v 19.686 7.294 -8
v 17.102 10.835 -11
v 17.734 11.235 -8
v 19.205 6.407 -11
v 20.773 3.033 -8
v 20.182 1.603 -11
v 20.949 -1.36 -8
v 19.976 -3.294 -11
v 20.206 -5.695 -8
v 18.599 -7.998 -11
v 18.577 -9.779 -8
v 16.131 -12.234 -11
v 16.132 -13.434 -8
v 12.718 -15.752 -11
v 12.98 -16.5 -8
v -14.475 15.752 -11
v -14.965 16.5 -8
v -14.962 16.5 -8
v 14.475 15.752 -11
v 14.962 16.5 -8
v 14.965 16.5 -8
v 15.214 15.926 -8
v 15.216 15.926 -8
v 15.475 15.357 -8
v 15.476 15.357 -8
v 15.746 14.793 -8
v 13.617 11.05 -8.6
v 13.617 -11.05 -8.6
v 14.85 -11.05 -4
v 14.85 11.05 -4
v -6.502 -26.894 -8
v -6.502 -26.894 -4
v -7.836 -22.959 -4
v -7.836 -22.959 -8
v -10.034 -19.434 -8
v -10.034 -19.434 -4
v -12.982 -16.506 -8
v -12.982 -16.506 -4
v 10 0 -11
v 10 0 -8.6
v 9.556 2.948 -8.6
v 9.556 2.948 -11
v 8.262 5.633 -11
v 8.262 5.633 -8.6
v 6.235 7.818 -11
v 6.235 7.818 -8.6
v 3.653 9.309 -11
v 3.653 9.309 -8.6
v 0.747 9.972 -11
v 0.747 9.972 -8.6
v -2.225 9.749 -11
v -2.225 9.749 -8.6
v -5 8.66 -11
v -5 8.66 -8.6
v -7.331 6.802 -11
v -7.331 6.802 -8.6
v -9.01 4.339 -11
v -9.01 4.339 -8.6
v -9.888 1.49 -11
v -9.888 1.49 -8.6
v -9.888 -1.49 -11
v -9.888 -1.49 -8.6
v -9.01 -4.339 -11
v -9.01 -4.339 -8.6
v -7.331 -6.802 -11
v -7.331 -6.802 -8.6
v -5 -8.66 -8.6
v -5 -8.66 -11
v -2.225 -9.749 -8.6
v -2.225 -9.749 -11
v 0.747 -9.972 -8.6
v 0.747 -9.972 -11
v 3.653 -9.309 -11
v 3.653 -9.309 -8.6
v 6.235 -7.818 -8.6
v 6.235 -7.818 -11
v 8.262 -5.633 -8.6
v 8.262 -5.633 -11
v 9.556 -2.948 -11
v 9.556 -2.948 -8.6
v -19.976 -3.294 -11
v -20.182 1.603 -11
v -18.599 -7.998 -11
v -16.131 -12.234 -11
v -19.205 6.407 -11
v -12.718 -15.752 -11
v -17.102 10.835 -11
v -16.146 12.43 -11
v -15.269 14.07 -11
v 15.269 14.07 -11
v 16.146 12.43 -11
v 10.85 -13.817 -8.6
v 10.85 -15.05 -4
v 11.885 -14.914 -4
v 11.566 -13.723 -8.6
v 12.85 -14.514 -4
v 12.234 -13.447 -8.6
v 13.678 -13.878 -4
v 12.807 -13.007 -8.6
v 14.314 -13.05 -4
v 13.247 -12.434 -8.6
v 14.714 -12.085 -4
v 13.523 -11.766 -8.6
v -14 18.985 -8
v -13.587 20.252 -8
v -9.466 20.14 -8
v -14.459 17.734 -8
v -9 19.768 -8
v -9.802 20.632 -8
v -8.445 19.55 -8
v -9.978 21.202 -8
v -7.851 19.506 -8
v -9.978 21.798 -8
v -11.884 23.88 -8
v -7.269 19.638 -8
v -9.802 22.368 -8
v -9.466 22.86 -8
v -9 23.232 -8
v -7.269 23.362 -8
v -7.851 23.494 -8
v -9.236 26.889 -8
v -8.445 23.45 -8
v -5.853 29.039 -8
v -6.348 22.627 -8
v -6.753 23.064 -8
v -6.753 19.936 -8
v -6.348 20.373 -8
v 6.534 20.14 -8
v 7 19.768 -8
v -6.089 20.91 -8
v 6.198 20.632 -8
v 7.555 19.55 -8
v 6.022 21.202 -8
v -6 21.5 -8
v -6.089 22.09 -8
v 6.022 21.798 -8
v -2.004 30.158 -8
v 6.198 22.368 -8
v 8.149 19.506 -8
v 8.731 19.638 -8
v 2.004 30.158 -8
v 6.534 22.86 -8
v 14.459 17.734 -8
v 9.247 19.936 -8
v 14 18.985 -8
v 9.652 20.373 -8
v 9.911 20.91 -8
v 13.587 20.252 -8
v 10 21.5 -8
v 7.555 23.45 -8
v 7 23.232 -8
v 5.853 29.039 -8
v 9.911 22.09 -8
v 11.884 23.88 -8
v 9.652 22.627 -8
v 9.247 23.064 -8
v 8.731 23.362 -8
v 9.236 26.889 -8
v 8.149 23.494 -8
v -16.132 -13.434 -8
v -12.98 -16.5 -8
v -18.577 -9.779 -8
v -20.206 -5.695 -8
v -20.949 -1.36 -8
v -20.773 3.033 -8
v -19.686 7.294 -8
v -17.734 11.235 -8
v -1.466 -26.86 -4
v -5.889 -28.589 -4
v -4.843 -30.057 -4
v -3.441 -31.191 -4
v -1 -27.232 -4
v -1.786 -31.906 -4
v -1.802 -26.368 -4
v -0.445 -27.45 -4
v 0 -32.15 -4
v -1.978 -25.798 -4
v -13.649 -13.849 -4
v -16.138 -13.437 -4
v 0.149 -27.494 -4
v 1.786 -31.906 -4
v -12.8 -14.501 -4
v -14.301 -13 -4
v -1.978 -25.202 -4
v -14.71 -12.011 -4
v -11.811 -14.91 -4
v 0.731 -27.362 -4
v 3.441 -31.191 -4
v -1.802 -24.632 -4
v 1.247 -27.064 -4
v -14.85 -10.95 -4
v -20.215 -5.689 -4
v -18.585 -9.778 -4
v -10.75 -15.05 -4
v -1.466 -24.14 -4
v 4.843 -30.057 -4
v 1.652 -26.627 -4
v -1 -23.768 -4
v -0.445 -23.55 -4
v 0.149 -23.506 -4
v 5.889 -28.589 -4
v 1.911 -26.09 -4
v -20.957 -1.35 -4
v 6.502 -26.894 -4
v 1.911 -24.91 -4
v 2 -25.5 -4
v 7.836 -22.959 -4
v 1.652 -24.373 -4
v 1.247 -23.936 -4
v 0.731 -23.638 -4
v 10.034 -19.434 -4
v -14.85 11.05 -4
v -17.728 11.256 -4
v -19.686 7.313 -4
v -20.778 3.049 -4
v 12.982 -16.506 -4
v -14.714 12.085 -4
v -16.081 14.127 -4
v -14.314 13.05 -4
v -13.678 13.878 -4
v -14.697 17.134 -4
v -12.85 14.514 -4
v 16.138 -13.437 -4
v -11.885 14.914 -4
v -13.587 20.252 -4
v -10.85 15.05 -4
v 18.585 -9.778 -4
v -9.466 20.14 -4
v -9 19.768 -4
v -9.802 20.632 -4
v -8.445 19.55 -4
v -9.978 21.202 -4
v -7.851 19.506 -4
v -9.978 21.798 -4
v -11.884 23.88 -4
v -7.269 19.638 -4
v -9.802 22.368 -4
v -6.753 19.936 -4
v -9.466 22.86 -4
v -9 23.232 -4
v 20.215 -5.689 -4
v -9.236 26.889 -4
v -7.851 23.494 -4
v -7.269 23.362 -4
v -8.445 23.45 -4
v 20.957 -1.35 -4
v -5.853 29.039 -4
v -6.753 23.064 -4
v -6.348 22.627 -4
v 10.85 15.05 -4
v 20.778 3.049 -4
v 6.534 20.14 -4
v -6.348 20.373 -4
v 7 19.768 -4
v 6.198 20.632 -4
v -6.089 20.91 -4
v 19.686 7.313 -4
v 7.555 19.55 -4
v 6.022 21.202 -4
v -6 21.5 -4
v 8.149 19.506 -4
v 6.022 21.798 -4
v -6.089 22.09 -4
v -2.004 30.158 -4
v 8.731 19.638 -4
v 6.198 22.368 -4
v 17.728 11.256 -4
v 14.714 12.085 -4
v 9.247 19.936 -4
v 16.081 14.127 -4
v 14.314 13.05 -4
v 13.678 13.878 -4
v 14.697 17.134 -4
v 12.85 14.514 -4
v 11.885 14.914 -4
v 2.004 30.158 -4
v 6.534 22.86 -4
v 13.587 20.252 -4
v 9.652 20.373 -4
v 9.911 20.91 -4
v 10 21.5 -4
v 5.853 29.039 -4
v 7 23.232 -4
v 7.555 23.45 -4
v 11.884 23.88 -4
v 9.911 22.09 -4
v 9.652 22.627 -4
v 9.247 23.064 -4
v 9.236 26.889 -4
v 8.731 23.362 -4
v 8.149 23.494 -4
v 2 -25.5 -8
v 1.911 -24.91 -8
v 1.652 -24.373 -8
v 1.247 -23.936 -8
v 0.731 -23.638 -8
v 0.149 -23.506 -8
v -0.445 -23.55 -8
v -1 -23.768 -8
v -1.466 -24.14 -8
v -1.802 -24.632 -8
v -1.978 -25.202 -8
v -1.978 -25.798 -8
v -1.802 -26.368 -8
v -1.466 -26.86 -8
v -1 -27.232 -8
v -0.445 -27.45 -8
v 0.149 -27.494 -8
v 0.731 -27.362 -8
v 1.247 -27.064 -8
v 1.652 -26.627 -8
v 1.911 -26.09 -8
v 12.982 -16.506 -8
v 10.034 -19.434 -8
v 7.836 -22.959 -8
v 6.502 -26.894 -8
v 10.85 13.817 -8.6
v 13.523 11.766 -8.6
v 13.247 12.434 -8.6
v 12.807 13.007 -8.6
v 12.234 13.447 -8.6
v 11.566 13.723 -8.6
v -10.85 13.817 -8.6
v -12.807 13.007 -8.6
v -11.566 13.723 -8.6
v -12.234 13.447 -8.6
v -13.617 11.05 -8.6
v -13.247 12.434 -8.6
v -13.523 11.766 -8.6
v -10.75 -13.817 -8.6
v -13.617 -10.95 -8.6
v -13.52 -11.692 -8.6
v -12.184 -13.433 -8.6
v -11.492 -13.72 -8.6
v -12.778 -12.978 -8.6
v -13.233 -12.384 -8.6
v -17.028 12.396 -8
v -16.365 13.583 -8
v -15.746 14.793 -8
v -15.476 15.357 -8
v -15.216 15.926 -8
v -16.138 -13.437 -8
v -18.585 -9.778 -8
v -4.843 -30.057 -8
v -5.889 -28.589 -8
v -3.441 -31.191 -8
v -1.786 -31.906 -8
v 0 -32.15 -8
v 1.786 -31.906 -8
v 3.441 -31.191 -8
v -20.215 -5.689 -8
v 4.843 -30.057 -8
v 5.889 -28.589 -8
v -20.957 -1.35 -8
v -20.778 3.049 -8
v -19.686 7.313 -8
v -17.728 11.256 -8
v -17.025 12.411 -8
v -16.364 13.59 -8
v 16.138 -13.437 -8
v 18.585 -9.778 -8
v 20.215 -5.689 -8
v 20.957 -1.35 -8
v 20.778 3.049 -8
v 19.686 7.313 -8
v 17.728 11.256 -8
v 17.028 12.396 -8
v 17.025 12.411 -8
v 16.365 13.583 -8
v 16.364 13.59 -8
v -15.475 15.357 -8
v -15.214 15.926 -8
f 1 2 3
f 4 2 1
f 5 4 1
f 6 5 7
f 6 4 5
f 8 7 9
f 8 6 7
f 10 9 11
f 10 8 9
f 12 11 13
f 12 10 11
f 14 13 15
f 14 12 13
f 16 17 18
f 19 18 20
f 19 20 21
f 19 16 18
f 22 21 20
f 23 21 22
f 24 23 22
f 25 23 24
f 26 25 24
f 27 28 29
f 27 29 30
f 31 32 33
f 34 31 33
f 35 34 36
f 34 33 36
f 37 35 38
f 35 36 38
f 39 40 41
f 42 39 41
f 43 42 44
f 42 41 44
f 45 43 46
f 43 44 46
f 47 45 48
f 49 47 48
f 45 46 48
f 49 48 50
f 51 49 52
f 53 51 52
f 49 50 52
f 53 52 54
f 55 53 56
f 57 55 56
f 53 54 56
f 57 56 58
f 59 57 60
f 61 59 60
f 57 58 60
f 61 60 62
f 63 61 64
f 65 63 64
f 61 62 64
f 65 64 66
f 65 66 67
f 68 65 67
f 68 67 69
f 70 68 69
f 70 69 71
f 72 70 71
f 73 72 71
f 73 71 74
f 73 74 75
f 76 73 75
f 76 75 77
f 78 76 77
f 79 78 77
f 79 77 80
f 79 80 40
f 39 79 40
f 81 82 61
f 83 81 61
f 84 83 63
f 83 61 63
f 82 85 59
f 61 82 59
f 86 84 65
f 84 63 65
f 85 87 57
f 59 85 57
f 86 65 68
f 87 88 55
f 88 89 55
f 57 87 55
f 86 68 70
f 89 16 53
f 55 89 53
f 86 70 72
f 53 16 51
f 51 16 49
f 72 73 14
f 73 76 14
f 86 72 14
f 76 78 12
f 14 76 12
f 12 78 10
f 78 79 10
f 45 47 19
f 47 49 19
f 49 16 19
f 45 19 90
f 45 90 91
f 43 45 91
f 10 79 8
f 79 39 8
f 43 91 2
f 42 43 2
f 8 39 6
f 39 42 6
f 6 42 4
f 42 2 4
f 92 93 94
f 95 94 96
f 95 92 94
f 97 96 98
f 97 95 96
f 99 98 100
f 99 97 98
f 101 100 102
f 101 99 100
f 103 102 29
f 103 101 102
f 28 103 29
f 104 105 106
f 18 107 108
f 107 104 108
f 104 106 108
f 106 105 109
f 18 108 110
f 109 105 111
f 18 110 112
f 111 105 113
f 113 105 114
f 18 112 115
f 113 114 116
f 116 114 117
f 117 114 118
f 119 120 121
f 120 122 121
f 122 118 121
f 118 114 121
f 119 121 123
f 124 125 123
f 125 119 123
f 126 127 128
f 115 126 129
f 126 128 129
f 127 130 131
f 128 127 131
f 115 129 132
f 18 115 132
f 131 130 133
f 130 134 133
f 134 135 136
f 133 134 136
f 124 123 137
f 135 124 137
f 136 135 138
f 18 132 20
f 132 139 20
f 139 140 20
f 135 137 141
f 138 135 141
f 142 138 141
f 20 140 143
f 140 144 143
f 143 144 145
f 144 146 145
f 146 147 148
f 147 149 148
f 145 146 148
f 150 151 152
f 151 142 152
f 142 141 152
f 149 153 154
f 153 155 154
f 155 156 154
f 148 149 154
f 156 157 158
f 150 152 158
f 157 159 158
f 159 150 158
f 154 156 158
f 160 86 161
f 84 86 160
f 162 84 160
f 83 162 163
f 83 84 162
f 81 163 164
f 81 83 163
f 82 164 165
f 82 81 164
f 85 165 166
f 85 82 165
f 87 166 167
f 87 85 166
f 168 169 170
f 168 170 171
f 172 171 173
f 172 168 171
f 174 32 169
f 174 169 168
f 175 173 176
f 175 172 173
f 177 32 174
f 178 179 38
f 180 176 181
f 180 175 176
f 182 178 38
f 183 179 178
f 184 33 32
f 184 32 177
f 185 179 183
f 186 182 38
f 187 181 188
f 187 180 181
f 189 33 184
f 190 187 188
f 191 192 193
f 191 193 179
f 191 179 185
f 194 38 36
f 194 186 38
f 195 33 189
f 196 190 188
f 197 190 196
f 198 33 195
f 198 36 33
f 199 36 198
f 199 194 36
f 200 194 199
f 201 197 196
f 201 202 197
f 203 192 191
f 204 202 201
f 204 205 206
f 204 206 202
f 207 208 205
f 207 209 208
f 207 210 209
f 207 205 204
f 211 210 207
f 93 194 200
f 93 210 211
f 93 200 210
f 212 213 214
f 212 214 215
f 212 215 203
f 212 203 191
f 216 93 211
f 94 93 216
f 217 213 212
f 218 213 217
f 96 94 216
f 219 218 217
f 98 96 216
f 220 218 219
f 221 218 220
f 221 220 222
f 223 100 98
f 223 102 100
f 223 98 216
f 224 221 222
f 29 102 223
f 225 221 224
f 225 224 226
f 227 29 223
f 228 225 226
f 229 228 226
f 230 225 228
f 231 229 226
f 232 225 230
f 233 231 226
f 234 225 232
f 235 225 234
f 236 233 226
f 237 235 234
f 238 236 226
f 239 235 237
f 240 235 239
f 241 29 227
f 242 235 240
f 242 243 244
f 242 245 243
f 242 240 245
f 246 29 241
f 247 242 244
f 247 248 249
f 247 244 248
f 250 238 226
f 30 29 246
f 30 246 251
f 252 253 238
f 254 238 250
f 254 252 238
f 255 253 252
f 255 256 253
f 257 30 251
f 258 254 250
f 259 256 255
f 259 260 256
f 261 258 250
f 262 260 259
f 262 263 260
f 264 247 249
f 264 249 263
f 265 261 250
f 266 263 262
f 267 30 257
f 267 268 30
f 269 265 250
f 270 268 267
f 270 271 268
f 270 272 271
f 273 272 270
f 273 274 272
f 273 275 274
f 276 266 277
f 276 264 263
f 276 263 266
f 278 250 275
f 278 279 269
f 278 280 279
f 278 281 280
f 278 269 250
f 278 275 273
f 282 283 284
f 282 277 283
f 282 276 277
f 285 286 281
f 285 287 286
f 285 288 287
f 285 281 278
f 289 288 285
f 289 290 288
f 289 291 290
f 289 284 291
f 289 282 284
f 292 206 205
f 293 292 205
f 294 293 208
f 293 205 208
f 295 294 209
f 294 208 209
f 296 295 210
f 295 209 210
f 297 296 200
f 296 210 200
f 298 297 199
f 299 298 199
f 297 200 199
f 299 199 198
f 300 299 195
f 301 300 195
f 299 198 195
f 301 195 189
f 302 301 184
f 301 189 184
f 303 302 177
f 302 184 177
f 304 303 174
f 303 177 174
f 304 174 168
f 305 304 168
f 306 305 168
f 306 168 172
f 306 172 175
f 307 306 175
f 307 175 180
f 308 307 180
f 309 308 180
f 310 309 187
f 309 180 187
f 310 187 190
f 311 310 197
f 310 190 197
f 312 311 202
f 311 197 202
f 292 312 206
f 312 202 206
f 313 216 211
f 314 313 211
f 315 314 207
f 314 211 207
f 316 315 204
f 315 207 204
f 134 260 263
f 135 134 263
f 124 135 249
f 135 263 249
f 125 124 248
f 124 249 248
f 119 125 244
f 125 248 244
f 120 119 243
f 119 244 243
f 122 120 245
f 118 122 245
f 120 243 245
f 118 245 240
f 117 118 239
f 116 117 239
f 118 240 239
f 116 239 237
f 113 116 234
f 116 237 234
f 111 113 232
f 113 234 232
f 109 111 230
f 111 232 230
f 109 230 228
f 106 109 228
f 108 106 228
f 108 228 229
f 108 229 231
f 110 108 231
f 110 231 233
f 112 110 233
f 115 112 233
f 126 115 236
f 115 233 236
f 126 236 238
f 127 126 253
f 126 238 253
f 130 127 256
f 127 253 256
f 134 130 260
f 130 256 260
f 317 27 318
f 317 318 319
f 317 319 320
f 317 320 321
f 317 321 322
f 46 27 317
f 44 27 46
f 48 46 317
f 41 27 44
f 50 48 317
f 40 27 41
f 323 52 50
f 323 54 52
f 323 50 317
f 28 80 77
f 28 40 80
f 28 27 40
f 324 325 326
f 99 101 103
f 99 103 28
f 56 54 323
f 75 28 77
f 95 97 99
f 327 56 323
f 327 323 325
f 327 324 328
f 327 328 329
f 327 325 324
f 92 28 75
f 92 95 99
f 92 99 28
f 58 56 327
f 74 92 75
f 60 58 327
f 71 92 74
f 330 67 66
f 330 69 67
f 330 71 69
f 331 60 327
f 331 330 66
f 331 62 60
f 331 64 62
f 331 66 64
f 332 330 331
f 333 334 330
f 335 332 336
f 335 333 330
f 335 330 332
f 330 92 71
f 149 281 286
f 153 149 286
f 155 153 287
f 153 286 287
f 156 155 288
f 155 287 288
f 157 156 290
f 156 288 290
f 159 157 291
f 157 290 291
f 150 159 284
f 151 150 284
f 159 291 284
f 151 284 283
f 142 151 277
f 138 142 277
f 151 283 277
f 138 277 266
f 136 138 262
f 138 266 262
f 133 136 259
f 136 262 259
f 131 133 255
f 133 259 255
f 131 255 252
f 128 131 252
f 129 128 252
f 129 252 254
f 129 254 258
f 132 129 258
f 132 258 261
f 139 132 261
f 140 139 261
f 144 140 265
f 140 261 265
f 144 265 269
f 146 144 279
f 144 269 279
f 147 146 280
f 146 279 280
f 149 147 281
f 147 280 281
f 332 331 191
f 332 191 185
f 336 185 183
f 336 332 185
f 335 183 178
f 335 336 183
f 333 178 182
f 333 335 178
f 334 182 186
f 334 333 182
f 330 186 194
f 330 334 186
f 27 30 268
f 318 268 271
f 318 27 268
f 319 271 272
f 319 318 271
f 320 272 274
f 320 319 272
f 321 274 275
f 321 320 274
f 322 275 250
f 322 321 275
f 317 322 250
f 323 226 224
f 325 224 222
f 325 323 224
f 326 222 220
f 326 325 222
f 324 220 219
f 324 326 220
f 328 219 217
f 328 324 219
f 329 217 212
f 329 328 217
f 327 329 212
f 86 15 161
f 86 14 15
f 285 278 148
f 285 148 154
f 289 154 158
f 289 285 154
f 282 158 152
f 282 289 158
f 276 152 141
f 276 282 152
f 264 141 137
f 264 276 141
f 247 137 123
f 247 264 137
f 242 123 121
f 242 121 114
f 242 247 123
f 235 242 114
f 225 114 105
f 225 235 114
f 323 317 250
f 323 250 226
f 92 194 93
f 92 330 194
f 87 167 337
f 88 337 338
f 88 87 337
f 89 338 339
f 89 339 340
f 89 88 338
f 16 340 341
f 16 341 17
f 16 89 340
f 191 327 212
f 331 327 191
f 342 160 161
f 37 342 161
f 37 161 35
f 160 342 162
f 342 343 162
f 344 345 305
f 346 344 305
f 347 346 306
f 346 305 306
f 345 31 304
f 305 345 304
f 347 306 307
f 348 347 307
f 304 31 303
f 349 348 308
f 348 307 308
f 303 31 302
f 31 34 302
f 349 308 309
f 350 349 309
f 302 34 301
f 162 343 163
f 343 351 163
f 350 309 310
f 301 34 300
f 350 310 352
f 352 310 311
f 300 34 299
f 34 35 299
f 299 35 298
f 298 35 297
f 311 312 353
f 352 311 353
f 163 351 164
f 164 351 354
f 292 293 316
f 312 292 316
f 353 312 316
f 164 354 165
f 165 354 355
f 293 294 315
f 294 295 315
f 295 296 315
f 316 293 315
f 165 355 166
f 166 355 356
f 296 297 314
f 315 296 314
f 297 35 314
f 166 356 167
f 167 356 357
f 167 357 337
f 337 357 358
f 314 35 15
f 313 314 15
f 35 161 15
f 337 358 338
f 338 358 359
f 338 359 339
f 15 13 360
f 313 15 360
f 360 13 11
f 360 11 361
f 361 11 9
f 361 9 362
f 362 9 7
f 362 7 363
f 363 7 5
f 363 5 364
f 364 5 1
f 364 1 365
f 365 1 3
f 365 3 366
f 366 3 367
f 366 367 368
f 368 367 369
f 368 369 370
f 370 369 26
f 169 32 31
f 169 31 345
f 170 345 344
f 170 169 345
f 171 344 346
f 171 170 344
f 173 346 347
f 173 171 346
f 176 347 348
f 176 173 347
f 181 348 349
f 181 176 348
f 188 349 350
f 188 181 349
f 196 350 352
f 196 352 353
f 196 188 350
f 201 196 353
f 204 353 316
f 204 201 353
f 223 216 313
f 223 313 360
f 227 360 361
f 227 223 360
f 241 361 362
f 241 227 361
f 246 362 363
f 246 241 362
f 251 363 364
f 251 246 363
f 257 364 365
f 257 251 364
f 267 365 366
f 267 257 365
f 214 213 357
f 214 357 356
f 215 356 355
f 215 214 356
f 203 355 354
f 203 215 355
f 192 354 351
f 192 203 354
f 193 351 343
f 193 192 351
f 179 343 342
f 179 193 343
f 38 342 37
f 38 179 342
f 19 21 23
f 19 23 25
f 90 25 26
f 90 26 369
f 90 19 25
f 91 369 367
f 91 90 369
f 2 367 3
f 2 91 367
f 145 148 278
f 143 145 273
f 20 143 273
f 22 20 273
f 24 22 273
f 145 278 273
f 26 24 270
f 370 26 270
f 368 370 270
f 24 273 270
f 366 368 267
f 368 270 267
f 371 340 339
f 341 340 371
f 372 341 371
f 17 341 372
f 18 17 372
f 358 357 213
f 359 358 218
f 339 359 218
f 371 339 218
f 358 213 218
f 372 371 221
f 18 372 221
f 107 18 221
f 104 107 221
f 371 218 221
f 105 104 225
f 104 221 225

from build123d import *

# Parameters (mm, degrees)
PAD018_DEPTH    = 3
PAD018_TAPER    = 14
SKETCH032_R     = 10
HOLE009_DEPTH   = 25
SKETCH034_R     = 2
PAD022_DEPTH    = 4
POCKET002_DEPTH = 4.6
POCKET002_TAPER = 15


with BuildPart() as part:
    # Sketch031 → Pad018 (new body)
    with BuildSketch(Plane.XY.offset(-4)):
        with BuildLine():
            ThreePointArc((-17.734351, 11.23491), (-16.243686, 13.811706), (-14.965, 16.5))
            Line((-14.965, 16.5), (14.965, 16.5))
            ThreePointArc((14.965, 16.5), (16.243686, 13.811706), (17.734351, 11.23491))
            ThreePointArc((12.98, -16.5), (20.691765, -3.547007), (17.734351, 11.23491))
            Line((-12.98, -16.5), (12.98, -16.5))
            ThreePointArc((-17.734351, 11.23491), (-20.691765, -3.547007), (-12.98, -16.5))
        make_face()
    extrude(amount=-PAD018_DEPTH, taper=PAD018_TAPER)

    # Sketch032 → Hole009 (cut)
    with BuildSketch(Plane.XY.offset(-4)):
        Circle(SKETCH032_R)
    extrude(amount=-HOLE009_DEPTH, mode=Mode.SUBTRACT)

    # Sketch034 → Pad022 (join)
    with BuildSketch(Plane.XY):
        with BuildLine():
            ThreePointArc((13.586881, 20.251823), (0, 30.3), (-13.586881, 20.251823))
            ThreePointArc((-17.728491, 11.256137), (-15.355357, 15.614788), (-13.586881, 20.251823))
            ThreePointArc((-17.728491, 11.256137), (-20.699674, -3.538854), (-12.982142, -16.506483))
            ThreePointArc((-6.502297, -26.893782), (-8.833051, -21.132971), (-12.982142, -16.506483))
            ThreePointArc((-6.502297, -26.893782), (0, -32.15), (6.502297, -26.893782))
            ThreePointArc((12.982142, -16.506483), (8.833051, -21.132971), (6.502297, -26.893782))
            ThreePointArc((12.982142, -16.506483), (20.699674, -3.538854), (17.728491, 11.256137))
            ThreePointArc((13.586881, 20.251823), (15.355357, 15.614788), (17.728491, 11.256137))
        make_face()
        with Locations((0, -25.5)):
            Circle(SKETCH034_R, mode=Mode.SUBTRACT)
        with Locations((-8, 21.5)):
            Circle(SKETCH034_R, mode=Mode.SUBTRACT)
        with Locations((8, 21.5)):
            Circle(SKETCH034_R, mode=Mode.SUBTRACT)
    extrude(amount=-PAD022_DEPTH)

    # Sketch035 → Pocket002 (cut)
    with BuildSketch(Plane.XY):
        with BuildLine():
            Line((-14.85, 11.05), (-14.85, -10.95))
            ThreePointArc((-14.85, -10.95), (-13.649138, -13.849138), (-10.75, -15.05))
            Line((-10.75, -15.05), (10.85, -15.05))
            ThreePointArc((10.85, -15.05), (13.678427, -13.878427), (14.85, -11.05))
            Line((14.85, -11.05), (14.85, 11.05))
            ThreePointArc((14.85, 11.05), (13.678427, 13.878427), (10.85, 15.05))
            Line((10.85, 15.05), (-10.85, 15.05))
            ThreePointArc((-10.85, 15.05), (-13.678427, 13.878427), (-14.85, 11.05))
        make_face()
    extrude(amount=-POCKET002_DEPTH, taper=POCKET002_TAPER, mode=Mode.SUBTRACT)


with BuildPart() as part_1:
    # Body010 placement: moved
    add(part.part.moved(Location((0, 0, -4))))


solid = part_1.part
